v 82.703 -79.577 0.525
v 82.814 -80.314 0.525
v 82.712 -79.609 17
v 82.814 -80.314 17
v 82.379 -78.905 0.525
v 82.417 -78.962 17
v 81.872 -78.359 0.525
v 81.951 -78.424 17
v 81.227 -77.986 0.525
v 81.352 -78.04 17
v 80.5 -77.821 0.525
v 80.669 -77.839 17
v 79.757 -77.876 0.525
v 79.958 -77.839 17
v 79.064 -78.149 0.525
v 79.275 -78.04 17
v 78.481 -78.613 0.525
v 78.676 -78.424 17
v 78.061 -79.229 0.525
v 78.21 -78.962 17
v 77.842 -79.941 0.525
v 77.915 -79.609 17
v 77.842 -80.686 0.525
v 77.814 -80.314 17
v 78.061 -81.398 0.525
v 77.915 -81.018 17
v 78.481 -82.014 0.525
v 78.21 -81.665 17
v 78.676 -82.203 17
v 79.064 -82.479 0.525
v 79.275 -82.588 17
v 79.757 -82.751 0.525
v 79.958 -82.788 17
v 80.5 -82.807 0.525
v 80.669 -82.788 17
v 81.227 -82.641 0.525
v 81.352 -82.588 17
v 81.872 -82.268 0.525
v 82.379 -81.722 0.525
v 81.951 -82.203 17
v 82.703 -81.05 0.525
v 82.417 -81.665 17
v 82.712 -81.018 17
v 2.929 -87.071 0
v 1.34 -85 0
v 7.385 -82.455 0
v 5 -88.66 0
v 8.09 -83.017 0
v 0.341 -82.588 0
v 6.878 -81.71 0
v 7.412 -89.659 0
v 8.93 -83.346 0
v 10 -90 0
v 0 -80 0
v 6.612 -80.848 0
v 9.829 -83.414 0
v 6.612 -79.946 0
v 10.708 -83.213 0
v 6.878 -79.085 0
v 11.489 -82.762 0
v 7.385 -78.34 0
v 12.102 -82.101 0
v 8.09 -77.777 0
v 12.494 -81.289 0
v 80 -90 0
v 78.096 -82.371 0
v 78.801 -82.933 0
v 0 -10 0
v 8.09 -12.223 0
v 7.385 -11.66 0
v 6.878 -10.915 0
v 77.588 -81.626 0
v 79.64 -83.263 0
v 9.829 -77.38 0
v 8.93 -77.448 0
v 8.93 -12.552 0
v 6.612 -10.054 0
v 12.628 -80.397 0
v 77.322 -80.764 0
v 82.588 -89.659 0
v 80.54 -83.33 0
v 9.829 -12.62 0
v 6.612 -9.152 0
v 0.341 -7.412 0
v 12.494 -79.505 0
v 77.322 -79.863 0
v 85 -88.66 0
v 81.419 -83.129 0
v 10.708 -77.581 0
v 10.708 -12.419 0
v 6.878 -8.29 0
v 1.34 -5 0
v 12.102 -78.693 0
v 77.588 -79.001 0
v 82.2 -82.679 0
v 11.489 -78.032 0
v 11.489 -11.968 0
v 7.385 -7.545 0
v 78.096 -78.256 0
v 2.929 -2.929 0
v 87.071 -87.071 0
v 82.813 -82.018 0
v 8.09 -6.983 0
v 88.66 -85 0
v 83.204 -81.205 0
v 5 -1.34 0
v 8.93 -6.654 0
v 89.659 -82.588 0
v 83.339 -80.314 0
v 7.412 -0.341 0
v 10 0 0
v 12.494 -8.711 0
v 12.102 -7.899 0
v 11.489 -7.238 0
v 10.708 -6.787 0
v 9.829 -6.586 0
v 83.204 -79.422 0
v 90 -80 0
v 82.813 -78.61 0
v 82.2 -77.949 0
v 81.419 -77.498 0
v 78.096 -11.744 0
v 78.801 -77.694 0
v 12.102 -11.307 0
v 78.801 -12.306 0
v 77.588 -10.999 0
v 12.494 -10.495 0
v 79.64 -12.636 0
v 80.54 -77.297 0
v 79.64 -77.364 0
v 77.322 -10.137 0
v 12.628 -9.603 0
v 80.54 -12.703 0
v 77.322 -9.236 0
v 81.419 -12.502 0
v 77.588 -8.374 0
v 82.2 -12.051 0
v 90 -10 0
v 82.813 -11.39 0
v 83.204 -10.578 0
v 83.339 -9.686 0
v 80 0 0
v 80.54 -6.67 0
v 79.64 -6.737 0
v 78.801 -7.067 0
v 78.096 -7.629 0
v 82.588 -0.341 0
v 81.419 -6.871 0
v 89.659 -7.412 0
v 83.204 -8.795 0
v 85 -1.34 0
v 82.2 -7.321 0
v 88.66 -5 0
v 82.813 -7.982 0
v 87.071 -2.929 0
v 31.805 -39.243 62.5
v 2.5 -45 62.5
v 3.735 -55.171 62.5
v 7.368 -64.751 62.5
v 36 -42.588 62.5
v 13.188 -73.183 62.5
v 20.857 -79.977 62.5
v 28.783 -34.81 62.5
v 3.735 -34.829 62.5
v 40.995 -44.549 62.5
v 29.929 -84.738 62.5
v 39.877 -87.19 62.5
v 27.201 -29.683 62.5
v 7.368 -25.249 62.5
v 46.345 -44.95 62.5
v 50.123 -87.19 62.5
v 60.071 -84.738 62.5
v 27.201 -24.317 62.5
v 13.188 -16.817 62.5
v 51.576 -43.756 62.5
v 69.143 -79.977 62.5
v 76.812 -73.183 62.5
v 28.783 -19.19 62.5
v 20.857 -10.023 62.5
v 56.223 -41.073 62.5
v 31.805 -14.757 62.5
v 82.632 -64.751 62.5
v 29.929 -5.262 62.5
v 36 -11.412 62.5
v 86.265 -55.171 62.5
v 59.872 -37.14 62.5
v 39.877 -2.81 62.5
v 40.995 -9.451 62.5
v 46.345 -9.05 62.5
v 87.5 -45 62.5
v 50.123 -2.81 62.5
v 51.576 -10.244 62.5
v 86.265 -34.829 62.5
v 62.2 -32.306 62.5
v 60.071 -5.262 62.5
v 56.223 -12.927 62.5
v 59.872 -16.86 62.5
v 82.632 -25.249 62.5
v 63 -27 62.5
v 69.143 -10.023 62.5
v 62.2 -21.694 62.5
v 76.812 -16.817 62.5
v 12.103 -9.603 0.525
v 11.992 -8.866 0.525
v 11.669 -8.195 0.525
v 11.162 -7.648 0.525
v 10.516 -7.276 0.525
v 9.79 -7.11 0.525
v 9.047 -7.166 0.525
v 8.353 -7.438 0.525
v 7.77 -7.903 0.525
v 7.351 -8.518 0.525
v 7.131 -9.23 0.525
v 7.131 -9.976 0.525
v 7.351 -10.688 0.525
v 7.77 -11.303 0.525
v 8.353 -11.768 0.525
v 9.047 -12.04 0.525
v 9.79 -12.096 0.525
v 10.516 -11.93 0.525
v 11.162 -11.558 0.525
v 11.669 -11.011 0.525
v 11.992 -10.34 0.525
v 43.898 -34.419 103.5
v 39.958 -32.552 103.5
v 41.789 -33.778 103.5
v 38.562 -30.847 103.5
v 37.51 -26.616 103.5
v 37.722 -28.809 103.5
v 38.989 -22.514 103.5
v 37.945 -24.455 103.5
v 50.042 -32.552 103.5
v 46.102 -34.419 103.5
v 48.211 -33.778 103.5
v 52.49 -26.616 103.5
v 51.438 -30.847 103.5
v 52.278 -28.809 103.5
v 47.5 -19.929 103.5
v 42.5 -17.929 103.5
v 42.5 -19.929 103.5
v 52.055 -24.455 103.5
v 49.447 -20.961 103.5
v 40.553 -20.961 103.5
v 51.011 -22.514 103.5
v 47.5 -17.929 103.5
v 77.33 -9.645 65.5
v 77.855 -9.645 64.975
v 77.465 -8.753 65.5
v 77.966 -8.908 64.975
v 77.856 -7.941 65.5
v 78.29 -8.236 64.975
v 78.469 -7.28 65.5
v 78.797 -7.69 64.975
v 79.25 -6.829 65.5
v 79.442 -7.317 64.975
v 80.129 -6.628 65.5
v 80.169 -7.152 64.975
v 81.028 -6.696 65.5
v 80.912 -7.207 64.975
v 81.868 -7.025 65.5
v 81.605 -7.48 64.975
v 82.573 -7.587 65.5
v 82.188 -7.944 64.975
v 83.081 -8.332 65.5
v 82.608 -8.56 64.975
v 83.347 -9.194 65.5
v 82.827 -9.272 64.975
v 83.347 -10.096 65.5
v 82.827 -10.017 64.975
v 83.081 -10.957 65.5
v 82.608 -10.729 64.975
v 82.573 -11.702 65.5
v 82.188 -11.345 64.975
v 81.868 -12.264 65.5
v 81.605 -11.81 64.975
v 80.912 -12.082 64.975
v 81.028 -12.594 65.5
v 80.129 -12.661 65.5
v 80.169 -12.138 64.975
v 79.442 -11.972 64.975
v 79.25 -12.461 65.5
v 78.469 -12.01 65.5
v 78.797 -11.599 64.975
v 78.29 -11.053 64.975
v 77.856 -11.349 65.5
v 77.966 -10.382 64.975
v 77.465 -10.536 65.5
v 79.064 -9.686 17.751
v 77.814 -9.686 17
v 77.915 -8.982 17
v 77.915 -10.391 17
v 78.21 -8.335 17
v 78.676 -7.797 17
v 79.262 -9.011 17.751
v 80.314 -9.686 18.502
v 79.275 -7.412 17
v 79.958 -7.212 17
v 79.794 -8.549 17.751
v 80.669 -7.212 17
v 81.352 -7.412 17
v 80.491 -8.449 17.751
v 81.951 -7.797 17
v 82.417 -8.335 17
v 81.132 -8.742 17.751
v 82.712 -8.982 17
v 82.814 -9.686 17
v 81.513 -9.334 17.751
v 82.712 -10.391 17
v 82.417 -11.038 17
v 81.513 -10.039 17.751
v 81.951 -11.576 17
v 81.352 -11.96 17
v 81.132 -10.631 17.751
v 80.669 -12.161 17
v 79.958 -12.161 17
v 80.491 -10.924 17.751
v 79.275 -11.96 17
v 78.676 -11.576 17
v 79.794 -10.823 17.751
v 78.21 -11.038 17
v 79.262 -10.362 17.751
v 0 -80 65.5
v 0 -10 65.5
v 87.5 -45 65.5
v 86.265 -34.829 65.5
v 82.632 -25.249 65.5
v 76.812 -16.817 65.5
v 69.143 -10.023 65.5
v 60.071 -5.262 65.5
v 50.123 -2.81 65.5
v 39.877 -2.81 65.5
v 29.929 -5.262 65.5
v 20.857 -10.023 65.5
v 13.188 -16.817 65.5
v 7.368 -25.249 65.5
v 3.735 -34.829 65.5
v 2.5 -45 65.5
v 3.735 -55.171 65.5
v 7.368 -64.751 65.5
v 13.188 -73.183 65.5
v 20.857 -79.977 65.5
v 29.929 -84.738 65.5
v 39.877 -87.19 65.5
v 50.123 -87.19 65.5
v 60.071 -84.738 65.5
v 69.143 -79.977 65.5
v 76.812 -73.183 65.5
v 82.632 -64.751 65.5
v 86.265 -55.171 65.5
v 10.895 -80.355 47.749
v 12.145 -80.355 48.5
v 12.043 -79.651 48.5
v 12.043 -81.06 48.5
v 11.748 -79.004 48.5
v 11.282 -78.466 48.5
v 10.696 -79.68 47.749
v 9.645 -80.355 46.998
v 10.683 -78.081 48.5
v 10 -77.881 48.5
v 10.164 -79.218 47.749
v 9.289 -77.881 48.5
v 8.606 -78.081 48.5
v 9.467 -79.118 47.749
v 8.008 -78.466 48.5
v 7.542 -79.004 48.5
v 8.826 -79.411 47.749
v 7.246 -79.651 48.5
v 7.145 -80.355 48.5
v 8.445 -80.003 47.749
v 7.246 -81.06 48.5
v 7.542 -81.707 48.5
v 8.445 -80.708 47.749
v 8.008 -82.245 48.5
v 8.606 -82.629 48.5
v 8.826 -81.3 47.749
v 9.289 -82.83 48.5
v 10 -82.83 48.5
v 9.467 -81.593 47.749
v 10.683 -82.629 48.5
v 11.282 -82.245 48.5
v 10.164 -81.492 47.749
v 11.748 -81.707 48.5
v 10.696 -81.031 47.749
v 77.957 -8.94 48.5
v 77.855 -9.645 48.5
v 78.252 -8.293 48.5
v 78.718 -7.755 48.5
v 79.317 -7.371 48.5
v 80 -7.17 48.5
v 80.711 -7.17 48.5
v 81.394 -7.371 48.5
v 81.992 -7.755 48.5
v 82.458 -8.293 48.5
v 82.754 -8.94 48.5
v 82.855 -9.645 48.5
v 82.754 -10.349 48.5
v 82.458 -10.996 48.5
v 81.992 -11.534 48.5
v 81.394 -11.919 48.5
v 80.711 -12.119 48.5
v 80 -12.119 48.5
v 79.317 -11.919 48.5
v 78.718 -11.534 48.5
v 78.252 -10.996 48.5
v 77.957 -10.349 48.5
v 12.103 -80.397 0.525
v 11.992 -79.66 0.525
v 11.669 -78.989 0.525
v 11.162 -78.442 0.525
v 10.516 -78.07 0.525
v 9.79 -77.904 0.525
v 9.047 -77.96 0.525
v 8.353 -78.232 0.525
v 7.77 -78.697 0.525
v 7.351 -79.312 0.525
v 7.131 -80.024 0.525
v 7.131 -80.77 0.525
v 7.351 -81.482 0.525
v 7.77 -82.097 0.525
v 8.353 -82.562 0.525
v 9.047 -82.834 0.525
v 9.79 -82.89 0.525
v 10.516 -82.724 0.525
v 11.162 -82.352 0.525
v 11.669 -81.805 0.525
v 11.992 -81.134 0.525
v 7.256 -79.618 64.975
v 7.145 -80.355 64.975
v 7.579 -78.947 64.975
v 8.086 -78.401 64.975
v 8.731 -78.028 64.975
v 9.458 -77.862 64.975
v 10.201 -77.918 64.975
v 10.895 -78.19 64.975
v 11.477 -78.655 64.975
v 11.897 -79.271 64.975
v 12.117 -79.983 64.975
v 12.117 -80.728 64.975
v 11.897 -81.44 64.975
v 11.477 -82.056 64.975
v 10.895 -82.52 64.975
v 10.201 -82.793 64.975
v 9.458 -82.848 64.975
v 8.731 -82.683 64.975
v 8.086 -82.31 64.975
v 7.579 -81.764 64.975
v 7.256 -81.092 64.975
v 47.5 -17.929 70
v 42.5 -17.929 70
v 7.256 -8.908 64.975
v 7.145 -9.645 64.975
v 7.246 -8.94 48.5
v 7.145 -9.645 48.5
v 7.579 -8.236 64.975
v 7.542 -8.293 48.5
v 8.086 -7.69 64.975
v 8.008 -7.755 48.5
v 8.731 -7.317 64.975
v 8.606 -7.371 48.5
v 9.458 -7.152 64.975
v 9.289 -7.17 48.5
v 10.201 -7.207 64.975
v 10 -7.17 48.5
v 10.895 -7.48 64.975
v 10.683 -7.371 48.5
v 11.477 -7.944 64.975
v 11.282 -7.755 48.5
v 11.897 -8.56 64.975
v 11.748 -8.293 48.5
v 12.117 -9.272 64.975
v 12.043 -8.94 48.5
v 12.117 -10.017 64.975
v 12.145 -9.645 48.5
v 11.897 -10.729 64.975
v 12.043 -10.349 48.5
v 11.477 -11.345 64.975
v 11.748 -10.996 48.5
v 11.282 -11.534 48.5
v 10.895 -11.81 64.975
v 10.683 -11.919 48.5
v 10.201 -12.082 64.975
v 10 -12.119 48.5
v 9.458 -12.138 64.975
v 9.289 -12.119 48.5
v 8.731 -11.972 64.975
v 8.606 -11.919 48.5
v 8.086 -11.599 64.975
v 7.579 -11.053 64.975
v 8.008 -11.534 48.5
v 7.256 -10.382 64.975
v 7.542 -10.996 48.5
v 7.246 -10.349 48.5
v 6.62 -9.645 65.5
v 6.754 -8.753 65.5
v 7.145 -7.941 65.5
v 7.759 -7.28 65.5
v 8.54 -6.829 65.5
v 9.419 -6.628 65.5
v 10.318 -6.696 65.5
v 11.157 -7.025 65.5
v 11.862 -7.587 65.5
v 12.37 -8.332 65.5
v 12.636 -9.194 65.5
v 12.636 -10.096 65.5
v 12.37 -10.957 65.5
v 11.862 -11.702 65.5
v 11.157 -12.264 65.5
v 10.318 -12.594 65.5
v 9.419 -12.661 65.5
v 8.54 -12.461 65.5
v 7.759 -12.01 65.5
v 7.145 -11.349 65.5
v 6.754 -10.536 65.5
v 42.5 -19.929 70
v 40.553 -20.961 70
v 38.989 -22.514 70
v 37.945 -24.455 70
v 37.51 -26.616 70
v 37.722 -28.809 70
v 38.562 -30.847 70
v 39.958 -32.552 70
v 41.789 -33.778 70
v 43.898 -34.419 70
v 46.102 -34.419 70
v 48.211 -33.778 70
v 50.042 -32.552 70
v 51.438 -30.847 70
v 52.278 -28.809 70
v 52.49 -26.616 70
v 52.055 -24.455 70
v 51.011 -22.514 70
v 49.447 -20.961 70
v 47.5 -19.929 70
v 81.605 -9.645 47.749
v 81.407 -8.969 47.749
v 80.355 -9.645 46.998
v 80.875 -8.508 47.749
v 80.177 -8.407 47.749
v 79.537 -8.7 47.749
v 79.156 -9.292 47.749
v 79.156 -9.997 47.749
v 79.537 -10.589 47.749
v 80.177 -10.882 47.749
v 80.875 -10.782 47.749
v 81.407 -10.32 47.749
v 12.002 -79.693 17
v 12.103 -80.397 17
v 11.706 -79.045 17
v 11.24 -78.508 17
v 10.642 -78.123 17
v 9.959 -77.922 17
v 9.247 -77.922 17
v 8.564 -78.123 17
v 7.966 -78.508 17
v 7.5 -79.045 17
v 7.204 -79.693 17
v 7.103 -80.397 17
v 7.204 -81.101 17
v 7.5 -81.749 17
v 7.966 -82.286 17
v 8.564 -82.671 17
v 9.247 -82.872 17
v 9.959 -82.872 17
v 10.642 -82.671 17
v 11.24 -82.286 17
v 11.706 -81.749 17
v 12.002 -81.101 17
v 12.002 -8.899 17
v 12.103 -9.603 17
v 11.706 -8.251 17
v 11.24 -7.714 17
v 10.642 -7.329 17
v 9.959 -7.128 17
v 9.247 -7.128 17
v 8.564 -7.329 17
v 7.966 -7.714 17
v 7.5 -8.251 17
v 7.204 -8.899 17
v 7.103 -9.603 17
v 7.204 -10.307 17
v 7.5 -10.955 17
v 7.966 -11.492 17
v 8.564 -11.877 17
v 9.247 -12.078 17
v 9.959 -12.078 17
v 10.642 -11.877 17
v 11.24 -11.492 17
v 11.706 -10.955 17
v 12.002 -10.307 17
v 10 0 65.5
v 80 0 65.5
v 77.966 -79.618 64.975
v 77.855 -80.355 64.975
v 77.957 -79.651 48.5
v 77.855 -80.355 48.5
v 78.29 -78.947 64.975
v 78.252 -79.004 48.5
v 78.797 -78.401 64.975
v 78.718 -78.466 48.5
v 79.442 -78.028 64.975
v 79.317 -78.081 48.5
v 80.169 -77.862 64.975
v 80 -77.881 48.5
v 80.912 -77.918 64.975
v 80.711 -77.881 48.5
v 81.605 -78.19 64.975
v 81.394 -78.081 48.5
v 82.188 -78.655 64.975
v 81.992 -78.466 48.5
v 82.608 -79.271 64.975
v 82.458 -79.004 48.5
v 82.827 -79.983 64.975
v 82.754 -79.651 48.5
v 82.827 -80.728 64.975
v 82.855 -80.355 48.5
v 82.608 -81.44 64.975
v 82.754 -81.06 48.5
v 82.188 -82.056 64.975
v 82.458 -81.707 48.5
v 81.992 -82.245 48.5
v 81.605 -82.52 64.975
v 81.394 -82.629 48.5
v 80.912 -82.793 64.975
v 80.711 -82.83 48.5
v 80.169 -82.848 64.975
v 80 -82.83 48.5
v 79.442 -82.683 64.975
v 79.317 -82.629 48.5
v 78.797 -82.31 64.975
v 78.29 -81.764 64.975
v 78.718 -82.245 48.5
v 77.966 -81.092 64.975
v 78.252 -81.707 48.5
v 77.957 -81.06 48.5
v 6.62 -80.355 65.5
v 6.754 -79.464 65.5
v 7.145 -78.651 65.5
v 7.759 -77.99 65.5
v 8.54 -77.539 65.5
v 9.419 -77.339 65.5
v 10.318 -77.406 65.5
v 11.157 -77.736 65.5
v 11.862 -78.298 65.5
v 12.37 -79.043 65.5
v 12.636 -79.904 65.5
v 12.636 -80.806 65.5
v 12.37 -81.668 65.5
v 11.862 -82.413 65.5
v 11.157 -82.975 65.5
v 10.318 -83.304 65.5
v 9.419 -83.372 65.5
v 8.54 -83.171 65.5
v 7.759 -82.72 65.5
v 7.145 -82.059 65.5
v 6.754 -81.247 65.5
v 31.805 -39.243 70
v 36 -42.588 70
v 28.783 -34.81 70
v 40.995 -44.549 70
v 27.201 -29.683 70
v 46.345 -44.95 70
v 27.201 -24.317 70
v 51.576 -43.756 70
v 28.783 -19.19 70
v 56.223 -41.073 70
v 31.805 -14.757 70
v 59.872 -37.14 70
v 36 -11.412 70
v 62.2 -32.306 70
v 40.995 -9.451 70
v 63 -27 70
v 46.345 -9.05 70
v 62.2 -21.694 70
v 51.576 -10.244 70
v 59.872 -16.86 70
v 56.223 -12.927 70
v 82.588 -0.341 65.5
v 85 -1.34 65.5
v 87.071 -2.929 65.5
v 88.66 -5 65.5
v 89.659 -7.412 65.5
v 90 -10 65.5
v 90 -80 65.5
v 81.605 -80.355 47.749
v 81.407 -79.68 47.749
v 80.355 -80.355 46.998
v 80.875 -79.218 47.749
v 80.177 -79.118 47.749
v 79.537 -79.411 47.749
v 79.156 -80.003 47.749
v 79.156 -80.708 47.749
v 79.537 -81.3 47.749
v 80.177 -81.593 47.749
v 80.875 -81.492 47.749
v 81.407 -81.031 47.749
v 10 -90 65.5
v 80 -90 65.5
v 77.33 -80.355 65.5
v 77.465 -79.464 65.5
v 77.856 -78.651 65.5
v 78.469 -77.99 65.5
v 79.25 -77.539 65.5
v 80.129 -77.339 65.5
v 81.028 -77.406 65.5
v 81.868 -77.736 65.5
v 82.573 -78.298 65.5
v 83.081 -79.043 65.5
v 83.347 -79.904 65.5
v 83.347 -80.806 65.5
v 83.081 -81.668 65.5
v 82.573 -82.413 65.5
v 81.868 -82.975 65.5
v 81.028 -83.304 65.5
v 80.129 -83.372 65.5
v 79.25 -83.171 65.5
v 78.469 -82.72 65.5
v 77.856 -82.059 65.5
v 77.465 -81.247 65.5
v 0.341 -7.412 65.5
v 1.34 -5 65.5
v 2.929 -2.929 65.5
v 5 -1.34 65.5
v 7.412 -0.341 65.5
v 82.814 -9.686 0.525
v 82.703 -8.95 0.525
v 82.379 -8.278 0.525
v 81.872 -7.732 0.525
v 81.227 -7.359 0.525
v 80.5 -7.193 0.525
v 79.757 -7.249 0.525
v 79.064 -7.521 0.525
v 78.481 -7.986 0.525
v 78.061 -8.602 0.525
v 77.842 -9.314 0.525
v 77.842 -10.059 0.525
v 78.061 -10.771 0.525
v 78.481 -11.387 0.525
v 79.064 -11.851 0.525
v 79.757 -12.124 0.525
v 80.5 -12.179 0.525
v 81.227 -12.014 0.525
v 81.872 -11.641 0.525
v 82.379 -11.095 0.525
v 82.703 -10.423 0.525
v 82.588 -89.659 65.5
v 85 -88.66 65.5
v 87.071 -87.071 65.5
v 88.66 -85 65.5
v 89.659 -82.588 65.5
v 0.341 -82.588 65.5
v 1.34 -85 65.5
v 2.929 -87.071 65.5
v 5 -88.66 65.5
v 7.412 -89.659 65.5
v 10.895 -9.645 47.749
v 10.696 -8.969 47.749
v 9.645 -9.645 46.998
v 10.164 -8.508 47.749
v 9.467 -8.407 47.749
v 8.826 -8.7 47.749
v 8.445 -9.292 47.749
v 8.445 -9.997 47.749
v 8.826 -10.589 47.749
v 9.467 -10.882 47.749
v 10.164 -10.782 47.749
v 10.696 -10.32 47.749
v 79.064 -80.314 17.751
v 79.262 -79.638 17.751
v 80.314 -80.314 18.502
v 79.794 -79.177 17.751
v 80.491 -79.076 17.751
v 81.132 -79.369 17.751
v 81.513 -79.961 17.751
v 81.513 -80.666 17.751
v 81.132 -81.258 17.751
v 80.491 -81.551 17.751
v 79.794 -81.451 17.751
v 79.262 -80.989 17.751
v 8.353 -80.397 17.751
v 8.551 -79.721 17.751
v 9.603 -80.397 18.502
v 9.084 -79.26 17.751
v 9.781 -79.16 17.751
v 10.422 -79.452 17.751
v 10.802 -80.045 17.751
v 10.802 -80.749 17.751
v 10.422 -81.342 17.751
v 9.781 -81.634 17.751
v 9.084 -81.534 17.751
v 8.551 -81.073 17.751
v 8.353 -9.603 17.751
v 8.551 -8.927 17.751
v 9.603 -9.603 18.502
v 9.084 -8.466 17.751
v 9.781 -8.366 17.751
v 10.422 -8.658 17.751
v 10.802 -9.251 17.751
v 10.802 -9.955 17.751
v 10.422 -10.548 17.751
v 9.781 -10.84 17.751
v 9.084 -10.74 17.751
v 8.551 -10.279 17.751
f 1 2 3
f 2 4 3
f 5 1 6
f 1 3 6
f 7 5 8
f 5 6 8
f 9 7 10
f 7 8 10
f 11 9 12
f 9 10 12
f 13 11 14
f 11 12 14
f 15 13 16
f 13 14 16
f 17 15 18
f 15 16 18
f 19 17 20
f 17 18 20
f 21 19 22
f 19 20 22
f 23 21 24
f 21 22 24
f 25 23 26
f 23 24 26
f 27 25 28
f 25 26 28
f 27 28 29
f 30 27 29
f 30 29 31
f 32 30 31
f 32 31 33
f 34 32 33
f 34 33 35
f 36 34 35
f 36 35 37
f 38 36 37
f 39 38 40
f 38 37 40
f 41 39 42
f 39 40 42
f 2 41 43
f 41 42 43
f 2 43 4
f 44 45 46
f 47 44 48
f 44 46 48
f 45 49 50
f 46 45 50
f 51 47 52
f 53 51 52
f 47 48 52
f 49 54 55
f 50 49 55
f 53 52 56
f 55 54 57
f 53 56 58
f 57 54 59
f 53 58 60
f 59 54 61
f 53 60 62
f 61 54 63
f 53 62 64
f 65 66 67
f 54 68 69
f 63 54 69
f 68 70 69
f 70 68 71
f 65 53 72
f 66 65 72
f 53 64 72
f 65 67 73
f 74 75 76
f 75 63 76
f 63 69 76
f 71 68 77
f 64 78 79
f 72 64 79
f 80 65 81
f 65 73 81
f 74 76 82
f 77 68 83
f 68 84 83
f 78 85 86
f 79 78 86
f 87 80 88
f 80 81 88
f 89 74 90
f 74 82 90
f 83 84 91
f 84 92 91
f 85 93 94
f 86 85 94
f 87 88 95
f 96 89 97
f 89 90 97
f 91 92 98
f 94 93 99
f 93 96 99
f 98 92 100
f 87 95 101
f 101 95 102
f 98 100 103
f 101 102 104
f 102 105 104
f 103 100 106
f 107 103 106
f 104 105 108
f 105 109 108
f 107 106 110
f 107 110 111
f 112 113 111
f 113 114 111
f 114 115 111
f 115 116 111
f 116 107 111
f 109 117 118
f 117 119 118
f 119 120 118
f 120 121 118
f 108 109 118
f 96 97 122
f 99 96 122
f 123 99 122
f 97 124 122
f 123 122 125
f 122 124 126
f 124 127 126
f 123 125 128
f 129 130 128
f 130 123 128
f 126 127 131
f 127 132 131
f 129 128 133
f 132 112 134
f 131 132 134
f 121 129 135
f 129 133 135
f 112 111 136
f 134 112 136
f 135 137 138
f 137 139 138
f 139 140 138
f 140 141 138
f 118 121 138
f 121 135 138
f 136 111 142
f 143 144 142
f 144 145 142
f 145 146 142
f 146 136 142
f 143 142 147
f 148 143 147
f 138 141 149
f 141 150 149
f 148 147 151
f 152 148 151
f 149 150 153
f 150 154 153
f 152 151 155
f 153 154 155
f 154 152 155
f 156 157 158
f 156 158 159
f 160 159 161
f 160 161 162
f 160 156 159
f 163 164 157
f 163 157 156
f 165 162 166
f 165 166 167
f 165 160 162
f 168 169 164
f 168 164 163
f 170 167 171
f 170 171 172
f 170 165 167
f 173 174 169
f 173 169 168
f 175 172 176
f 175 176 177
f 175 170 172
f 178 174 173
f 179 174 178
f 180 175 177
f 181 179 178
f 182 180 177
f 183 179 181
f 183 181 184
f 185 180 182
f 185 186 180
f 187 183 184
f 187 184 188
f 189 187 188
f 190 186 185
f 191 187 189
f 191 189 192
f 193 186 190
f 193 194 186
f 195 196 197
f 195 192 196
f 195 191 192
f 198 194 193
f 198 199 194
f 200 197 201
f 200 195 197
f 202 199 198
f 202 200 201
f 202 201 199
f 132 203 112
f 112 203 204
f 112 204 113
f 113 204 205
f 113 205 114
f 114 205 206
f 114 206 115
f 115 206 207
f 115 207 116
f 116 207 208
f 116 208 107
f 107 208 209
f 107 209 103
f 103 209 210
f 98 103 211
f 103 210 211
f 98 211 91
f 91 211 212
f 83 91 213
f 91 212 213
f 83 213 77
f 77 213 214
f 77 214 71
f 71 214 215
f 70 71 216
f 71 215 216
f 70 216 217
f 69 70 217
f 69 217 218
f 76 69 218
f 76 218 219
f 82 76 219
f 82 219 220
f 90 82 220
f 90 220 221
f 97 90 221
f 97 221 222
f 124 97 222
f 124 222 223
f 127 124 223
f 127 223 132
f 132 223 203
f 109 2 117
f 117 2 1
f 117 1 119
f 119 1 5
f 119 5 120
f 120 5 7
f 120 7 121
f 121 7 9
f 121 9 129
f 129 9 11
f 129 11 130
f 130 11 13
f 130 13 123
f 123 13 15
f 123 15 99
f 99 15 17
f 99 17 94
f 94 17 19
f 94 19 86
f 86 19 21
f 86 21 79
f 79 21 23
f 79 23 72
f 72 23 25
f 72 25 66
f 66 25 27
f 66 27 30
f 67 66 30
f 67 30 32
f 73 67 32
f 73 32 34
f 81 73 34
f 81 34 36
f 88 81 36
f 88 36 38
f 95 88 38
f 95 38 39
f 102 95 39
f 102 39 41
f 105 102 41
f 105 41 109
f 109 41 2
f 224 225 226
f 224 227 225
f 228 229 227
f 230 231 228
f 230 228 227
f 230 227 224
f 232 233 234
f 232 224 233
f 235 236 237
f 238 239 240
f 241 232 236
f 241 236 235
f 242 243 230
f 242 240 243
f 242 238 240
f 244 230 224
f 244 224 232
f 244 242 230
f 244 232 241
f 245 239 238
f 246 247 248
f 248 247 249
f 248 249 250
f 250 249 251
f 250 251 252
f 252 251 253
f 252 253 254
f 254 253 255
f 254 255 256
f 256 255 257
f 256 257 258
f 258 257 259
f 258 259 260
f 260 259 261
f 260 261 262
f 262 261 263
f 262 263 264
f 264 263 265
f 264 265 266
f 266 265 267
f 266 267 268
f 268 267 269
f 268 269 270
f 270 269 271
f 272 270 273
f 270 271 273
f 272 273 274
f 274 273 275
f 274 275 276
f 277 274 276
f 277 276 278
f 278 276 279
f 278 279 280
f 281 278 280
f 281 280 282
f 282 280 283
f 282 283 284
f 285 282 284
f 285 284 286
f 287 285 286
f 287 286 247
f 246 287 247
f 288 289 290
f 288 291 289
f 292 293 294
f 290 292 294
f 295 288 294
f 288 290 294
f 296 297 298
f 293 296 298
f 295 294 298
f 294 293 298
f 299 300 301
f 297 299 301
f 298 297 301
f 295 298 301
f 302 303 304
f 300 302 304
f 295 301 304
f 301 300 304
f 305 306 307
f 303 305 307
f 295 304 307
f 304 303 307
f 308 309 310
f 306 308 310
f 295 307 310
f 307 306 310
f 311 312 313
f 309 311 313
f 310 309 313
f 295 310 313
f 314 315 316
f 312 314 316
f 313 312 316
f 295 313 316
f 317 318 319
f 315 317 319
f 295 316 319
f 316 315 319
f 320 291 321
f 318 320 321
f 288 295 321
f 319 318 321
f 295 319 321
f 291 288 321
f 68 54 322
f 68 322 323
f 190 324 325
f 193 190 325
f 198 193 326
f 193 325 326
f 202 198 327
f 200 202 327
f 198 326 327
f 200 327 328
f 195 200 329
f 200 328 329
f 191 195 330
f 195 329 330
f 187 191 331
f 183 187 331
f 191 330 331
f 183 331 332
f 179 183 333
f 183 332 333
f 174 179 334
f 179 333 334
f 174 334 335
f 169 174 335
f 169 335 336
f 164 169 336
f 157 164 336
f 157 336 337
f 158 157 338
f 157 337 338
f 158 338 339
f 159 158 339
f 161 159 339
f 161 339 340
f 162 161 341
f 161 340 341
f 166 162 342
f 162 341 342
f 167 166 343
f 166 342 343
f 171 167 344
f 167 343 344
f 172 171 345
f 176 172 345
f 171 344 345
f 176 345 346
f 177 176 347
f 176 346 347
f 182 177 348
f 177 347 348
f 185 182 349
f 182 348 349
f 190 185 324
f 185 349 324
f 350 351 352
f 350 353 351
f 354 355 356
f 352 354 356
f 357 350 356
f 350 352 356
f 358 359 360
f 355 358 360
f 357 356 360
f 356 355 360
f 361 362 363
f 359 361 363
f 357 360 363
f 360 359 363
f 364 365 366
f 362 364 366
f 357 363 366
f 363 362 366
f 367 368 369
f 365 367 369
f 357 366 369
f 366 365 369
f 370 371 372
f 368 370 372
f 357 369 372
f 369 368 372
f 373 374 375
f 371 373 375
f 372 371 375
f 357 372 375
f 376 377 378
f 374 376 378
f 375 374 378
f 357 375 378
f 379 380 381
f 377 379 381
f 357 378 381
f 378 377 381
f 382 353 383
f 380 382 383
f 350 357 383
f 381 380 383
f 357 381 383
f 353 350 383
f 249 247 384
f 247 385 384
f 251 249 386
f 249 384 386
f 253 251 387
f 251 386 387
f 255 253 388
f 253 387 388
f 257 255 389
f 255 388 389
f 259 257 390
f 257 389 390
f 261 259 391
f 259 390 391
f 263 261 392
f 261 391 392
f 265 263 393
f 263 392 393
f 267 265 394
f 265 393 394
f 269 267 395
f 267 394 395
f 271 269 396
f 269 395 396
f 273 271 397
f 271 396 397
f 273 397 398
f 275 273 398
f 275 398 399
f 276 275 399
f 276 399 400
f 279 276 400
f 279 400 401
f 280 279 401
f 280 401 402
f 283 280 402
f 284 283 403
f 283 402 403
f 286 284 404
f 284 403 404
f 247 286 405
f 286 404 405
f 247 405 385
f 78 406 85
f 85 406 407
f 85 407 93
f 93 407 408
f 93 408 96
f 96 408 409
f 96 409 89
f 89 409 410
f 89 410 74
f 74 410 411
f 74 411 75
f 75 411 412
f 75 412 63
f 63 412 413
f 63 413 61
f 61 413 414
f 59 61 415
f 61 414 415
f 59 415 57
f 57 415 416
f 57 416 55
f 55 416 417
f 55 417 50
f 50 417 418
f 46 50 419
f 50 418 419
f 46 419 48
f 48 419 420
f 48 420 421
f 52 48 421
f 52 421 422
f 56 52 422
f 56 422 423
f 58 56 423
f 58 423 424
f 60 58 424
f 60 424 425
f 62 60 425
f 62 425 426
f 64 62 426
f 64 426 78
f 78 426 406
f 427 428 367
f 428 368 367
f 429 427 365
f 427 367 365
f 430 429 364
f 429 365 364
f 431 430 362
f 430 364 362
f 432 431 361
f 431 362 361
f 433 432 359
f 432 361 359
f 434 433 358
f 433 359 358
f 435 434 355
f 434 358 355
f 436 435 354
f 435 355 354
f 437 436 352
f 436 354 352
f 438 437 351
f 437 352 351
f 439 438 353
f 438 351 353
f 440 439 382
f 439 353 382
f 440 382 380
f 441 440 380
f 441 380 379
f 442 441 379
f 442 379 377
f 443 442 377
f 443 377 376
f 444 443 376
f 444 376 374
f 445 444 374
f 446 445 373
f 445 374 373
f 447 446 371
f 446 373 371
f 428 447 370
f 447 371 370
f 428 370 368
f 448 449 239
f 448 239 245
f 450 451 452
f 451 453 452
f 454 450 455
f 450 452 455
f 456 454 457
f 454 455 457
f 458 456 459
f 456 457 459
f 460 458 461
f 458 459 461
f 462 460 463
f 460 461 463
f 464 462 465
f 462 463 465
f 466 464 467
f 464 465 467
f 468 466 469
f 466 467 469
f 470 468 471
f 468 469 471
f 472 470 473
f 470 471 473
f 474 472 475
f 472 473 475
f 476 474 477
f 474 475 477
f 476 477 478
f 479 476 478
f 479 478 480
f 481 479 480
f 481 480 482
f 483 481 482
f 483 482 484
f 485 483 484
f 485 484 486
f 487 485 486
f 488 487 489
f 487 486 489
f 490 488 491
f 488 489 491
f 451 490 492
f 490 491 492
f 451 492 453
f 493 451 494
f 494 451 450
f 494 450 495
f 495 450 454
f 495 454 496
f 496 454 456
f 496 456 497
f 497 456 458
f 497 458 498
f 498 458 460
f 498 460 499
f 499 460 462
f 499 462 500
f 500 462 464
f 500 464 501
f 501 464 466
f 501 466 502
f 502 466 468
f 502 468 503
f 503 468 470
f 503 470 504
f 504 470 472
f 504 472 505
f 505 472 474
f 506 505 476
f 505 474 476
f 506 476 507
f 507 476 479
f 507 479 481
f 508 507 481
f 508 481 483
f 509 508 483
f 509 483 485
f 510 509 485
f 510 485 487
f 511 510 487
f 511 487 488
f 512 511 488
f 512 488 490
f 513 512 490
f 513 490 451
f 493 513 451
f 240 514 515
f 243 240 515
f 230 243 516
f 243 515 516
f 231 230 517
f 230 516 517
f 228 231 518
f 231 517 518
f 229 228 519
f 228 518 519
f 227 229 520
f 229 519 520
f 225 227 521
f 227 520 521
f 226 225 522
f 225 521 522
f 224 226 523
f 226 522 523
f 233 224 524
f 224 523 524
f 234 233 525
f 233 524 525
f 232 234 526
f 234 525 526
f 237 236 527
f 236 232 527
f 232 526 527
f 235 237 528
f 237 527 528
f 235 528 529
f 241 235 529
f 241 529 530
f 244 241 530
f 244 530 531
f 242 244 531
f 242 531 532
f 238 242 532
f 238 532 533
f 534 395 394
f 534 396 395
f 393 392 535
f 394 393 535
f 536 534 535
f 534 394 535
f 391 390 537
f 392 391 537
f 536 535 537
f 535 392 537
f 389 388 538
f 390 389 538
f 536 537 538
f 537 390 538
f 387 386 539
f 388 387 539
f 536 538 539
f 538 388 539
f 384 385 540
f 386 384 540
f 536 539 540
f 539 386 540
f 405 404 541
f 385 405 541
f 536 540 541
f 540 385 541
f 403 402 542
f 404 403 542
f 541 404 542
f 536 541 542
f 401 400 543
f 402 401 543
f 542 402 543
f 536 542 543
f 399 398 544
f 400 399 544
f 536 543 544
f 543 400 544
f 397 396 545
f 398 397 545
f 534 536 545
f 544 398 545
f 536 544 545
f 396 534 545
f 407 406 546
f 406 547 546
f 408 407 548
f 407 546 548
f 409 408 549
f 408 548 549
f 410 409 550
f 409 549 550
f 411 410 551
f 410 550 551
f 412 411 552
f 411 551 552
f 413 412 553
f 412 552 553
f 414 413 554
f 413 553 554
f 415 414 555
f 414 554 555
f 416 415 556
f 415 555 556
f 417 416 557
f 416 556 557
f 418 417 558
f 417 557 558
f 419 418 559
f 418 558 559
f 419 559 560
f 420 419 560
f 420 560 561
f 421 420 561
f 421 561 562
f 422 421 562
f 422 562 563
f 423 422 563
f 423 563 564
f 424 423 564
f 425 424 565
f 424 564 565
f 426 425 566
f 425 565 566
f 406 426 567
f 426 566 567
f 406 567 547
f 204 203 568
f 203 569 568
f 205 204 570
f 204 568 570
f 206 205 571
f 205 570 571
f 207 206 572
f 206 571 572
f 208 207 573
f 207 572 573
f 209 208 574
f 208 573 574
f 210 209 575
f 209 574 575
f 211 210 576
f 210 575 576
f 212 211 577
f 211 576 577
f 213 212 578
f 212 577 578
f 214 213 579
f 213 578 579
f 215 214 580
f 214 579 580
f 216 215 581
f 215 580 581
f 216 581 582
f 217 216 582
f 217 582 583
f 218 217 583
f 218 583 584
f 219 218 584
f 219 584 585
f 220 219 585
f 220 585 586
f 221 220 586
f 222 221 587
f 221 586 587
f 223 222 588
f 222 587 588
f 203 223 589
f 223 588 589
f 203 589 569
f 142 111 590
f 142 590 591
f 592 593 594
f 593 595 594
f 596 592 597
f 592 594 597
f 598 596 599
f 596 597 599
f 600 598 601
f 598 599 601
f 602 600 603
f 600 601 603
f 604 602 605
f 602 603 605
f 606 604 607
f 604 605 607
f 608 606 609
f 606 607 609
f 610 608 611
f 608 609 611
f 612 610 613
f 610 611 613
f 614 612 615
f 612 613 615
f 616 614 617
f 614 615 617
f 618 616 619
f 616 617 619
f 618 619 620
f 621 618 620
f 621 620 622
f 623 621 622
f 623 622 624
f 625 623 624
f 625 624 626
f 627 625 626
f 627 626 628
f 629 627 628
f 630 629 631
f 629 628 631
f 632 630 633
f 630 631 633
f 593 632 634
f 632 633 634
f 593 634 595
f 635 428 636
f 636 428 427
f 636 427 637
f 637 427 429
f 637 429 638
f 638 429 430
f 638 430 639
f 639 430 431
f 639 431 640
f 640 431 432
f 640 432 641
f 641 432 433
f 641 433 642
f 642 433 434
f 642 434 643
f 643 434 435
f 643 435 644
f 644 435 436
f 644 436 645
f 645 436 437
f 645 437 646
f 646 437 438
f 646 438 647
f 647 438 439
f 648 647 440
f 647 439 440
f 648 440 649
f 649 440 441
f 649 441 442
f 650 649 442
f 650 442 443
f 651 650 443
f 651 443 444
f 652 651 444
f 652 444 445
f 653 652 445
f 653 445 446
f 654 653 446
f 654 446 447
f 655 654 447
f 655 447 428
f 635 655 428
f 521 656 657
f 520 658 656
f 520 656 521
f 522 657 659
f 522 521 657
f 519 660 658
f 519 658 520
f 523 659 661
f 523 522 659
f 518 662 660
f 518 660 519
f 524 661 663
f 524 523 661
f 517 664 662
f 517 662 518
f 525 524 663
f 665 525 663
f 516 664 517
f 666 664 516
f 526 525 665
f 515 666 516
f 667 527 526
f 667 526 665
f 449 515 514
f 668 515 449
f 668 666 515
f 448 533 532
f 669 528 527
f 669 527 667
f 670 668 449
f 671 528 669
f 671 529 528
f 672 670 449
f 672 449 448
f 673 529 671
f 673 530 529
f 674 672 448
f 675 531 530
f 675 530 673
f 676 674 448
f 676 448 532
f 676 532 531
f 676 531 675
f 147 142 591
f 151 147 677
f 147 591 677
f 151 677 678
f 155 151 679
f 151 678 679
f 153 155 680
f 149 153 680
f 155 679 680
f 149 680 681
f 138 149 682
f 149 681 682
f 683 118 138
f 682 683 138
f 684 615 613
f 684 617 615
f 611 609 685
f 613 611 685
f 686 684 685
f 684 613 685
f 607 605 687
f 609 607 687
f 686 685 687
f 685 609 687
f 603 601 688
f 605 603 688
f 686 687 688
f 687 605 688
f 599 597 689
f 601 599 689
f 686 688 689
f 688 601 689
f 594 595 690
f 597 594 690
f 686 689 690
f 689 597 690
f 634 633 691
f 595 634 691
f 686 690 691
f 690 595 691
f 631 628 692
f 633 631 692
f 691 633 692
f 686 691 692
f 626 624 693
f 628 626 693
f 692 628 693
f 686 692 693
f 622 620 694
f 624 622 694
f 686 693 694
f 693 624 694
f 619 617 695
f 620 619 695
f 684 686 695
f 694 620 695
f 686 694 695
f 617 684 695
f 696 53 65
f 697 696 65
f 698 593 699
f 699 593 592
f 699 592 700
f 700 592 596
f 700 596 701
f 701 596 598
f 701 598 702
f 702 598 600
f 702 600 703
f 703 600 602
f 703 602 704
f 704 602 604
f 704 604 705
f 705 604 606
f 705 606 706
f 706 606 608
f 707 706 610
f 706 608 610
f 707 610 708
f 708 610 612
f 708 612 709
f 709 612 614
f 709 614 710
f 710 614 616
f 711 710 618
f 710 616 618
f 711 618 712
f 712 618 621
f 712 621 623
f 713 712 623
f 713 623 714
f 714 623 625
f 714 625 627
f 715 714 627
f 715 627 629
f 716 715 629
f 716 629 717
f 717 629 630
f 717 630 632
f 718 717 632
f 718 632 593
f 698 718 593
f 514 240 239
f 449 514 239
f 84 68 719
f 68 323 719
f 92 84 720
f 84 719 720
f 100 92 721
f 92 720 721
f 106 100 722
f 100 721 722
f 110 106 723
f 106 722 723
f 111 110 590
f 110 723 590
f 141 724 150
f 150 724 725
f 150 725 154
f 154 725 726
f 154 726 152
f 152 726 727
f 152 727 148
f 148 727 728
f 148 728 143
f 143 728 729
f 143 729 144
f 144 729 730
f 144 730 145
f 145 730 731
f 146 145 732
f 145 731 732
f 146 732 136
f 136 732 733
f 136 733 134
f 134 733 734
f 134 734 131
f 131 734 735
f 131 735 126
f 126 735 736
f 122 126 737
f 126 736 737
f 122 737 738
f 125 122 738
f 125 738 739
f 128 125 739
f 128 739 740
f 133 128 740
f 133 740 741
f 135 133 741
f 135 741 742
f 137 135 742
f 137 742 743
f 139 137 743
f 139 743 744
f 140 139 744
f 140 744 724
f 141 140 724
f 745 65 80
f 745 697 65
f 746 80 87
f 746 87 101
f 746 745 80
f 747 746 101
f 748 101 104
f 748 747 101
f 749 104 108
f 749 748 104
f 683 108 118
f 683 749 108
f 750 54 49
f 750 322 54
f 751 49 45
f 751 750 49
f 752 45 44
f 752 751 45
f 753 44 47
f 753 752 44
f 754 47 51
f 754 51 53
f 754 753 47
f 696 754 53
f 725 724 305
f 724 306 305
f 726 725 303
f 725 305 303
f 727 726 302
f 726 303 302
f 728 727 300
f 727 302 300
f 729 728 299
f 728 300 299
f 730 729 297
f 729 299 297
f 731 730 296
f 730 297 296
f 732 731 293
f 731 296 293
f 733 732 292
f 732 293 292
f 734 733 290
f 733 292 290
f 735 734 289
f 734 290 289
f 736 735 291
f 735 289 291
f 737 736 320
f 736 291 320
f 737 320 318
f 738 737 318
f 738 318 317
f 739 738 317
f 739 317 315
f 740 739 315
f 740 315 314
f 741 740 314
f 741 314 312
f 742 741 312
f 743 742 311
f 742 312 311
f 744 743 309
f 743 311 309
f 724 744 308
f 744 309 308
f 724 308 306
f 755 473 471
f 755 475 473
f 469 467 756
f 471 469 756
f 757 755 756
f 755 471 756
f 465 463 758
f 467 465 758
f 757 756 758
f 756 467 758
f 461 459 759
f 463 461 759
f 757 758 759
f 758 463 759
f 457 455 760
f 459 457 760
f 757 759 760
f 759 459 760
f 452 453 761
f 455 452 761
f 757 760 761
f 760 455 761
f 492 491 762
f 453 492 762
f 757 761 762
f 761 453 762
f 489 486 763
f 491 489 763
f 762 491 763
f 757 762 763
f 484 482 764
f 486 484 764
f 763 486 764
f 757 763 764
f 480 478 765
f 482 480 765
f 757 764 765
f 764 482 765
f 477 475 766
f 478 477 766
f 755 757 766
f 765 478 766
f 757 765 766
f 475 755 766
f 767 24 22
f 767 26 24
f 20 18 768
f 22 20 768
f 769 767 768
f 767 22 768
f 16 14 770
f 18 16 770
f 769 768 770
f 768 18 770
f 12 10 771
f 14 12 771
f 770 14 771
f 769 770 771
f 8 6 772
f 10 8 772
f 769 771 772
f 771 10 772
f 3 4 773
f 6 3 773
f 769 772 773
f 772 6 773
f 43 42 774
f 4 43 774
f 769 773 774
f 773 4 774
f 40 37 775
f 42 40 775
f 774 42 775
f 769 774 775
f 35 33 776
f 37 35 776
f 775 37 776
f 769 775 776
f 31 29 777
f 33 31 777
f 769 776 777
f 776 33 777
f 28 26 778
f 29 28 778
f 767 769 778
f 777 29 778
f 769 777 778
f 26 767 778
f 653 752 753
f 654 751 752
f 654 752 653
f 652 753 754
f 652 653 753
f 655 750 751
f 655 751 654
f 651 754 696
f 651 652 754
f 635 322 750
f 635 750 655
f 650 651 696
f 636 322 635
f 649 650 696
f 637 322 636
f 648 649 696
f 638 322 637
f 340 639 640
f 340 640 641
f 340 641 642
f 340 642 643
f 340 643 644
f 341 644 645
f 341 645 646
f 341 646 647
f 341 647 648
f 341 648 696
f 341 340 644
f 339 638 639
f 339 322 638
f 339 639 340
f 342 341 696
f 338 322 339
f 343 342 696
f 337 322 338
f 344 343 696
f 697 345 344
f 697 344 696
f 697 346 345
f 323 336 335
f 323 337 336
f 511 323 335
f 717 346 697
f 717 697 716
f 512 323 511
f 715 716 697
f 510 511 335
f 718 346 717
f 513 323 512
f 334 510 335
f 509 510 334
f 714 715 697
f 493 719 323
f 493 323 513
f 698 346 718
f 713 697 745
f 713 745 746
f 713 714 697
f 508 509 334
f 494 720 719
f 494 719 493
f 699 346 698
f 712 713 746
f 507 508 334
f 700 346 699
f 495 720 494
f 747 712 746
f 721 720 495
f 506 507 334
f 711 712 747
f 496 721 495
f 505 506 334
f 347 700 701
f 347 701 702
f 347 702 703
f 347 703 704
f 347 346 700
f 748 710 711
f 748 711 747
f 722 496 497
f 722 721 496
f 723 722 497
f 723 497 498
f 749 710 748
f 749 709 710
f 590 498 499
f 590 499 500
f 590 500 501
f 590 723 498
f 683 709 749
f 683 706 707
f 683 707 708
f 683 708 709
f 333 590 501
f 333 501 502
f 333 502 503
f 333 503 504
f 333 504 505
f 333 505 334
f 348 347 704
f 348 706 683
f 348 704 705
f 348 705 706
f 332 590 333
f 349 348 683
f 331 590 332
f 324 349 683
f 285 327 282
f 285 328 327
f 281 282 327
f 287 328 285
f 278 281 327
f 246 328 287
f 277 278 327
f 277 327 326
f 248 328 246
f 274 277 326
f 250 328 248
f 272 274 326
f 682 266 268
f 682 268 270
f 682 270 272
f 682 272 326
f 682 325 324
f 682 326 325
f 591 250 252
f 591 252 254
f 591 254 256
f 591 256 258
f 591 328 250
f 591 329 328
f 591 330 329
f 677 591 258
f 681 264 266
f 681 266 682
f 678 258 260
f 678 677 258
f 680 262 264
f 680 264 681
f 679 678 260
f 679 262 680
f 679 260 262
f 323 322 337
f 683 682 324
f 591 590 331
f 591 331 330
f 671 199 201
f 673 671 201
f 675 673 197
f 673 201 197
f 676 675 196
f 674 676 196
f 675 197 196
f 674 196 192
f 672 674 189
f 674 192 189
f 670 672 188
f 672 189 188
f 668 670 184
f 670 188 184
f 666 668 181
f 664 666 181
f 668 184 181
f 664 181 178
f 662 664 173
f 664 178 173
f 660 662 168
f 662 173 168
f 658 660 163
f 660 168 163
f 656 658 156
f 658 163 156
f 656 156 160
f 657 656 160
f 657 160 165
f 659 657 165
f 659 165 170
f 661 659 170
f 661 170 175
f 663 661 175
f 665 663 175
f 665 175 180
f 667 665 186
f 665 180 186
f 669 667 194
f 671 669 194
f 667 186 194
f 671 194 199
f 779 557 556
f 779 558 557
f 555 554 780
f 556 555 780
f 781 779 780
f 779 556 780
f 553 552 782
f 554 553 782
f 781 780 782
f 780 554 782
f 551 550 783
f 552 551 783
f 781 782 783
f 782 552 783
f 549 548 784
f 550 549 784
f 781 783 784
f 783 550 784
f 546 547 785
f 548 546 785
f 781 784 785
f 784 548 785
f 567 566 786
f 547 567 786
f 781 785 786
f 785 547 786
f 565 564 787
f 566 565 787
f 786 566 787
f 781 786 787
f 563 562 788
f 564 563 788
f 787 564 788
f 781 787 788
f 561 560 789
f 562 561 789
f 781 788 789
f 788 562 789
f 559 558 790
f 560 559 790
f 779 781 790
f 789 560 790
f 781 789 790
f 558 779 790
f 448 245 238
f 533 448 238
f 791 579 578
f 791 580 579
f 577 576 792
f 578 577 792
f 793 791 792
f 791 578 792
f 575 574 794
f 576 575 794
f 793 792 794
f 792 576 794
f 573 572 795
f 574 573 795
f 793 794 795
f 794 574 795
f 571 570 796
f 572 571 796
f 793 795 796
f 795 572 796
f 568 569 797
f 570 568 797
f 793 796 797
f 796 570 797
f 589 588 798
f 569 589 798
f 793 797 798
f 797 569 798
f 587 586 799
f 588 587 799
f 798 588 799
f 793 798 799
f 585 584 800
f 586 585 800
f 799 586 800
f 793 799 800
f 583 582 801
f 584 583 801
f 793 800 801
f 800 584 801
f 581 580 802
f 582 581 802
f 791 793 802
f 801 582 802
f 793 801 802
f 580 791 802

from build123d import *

# Parameters (mm, degrees)
SKETCH_1_W                   = 90
SKETCH_1_H                   = 90
EXTRUDE_2_DEPTH              = 65.5
SKETCH_2_R                   = 42.5
CUT_EXTRUDE_1_DEPTH          = 3
SKETCH_3_R                   = 18
EXTRUDE_3_DEPTH              = 7.5
SKETCH_4_R                   = 7.5
EXTRUDE_4_DEPTH              = 33.5
EXTRUDE_5_REACH              = 166.05
HOLE_WIZARD_M6_1_D           = 5
HOLE_WIZARD_M6_1_DEPTH       = 17
HOLE_WIZARD_M6_1_CSINK_D     = 6.05
HOLE_WIZARD_M6_1_CSINK_ANGLE = 90
HOLE_WIZARD_M6_1_TIP         = 1.502151548
FILLET_1_R                   = 10
HOLE_WIZARD_M6_2_D           = 5
HOLE_WIZARD_M6_2_DEPTH       = 17
HOLE_WIZARD_M6_2_CSINK_D     = 6.05
HOLE_WIZARD_M6_2_CSINK_ANGLE = 90
HOLE_WIZARD_M6_2_TIP         = 1.502151548


with BuildPart() as part:
    # 草图1 → 凸台-拉伸2 (new body)
    with BuildSketch(Plane.XY):
        with Locations((45, -45)):
            Rectangle(SKETCH_1_W, SKETCH_1_H)
    extrude(amount=EXTRUDE_2_DEPTH)

    # 草图2 → 切除-拉伸1 (cut)
    with BuildSketch(Plane.XY.offset(65.5)):
        with Locations((45, -45)):
            Circle(SKETCH_2_R)
    extrude(amount=-CUT_EXTRUDE_1_DEPTH, mode=Mode.SUBTRACT)

    # 草图3 → 凸台-拉伸3 (add)
    with BuildSketch(Plane.XY.offset(62.5)):
        with Locations((45, -27)):
            Circle(SKETCH_3_R)
    extrude(amount=EXTRUDE_3_DEPTH)

    # 草图4 → 凸台-拉伸4 (add)
    with BuildSketch(Plane.XY.offset(70)):
        with Locations((45, -27)):
            Circle(SKETCH_4_R)
    extrude(amount=EXTRUDE_4_DEPTH)

    # 草图5 → 凸台-拉伸5 (add, up to next)
    with BuildSketch(Plane.XY.offset(103.5), mode=Mode.PRIVATE) as extrude_5_sk1:
        with BuildLine():
            Line((42.5, -19.928932188), (42.5, -17.928932188))
            Line((42.5, -17.928932188), (47.5, -17.928932188))
            Line((47.5, -17.928932188), (47.5, -19.928932188))
            ThreePointArc((47.5, -19.928932188), (45, -19.5), (42.5, -19.928932188))
        make_face()
    extrude_5_tool1 = extrude(extrude_5_sk1.sketch, amount=-EXTRUDE_5_REACH, mode=Mode.PRIVATE) - part.part
    add(extrude_5_tool1.solids().sort_by_distance((45, -18.789851, 103.5))[0])

    # M6 螺纹孔1
    with Locations(Plane.XY.offset(65.5)):
        with Locations((9.644660941, -9.644660941), (80.355339059, -9.644660941), (9.644660941, -80.355339059), (80.355339059, -80.355339059)):
            CounterSinkHole(HOLE_WIZARD_M6_1_D / 2, HOLE_WIZARD_M6_1_CSINK_D / 2, depth=HOLE_WIZARD_M6_1_DEPTH, counter_sink_angle=HOLE_WIZARD_M6_1_CSINK_ANGLE)
            with Locations((0, 0, -(HOLE_WIZARD_M6_1_DEPTH + HOLE_WIZARD_M6_1_TIP / 2))):  # 118° drill point
                Cone(0, HOLE_WIZARD_M6_1_D / 2, HOLE_WIZARD_M6_1_TIP, mode=Mode.SUBTRACT)

    # 圆角1
    fillet_1_edges = [part.edges().sort_by_distance(p)[0] for p in [
        (0, 0, 32.75),
        (90, 0, 32.75),
        (90, -90, 32.75),
        (0, -90, 32.75),
    ]]
    fillet(fillet_1_edges, radius=FILLET_1_R)

    # M6 螺纹孔2
    with Locations(Plane(origin=(0, 0, 0), x_dir=(-1, 0, 0), z_dir=(0, 0, -1))):
        with Locations((-9.602967378, -80.397032622), (-80.31359627, -9.68640373), (-9.602967378, -9.602967378), (-80.31359627, -80.31359627)):
            CounterSinkHole(HOLE_WIZARD_M6_2_D / 2, HOLE_WIZARD_M6_2_CSINK_D / 2, depth=HOLE_WIZARD_M6_2_DEPTH, counter_sink_angle=HOLE_WIZARD_M6_2_CSINK_ANGLE)
            with Locations((0, 0, -(HOLE_WIZARD_M6_2_DEPTH + HOLE_WIZARD_M6_2_TIP / 2))):  # 118° drill point
                Cone(0, HOLE_WIZARD_M6_2_D / 2, HOLE_WIZARD_M6_2_TIP, mode=Mode.SUBTRACT)


solid = part.part
